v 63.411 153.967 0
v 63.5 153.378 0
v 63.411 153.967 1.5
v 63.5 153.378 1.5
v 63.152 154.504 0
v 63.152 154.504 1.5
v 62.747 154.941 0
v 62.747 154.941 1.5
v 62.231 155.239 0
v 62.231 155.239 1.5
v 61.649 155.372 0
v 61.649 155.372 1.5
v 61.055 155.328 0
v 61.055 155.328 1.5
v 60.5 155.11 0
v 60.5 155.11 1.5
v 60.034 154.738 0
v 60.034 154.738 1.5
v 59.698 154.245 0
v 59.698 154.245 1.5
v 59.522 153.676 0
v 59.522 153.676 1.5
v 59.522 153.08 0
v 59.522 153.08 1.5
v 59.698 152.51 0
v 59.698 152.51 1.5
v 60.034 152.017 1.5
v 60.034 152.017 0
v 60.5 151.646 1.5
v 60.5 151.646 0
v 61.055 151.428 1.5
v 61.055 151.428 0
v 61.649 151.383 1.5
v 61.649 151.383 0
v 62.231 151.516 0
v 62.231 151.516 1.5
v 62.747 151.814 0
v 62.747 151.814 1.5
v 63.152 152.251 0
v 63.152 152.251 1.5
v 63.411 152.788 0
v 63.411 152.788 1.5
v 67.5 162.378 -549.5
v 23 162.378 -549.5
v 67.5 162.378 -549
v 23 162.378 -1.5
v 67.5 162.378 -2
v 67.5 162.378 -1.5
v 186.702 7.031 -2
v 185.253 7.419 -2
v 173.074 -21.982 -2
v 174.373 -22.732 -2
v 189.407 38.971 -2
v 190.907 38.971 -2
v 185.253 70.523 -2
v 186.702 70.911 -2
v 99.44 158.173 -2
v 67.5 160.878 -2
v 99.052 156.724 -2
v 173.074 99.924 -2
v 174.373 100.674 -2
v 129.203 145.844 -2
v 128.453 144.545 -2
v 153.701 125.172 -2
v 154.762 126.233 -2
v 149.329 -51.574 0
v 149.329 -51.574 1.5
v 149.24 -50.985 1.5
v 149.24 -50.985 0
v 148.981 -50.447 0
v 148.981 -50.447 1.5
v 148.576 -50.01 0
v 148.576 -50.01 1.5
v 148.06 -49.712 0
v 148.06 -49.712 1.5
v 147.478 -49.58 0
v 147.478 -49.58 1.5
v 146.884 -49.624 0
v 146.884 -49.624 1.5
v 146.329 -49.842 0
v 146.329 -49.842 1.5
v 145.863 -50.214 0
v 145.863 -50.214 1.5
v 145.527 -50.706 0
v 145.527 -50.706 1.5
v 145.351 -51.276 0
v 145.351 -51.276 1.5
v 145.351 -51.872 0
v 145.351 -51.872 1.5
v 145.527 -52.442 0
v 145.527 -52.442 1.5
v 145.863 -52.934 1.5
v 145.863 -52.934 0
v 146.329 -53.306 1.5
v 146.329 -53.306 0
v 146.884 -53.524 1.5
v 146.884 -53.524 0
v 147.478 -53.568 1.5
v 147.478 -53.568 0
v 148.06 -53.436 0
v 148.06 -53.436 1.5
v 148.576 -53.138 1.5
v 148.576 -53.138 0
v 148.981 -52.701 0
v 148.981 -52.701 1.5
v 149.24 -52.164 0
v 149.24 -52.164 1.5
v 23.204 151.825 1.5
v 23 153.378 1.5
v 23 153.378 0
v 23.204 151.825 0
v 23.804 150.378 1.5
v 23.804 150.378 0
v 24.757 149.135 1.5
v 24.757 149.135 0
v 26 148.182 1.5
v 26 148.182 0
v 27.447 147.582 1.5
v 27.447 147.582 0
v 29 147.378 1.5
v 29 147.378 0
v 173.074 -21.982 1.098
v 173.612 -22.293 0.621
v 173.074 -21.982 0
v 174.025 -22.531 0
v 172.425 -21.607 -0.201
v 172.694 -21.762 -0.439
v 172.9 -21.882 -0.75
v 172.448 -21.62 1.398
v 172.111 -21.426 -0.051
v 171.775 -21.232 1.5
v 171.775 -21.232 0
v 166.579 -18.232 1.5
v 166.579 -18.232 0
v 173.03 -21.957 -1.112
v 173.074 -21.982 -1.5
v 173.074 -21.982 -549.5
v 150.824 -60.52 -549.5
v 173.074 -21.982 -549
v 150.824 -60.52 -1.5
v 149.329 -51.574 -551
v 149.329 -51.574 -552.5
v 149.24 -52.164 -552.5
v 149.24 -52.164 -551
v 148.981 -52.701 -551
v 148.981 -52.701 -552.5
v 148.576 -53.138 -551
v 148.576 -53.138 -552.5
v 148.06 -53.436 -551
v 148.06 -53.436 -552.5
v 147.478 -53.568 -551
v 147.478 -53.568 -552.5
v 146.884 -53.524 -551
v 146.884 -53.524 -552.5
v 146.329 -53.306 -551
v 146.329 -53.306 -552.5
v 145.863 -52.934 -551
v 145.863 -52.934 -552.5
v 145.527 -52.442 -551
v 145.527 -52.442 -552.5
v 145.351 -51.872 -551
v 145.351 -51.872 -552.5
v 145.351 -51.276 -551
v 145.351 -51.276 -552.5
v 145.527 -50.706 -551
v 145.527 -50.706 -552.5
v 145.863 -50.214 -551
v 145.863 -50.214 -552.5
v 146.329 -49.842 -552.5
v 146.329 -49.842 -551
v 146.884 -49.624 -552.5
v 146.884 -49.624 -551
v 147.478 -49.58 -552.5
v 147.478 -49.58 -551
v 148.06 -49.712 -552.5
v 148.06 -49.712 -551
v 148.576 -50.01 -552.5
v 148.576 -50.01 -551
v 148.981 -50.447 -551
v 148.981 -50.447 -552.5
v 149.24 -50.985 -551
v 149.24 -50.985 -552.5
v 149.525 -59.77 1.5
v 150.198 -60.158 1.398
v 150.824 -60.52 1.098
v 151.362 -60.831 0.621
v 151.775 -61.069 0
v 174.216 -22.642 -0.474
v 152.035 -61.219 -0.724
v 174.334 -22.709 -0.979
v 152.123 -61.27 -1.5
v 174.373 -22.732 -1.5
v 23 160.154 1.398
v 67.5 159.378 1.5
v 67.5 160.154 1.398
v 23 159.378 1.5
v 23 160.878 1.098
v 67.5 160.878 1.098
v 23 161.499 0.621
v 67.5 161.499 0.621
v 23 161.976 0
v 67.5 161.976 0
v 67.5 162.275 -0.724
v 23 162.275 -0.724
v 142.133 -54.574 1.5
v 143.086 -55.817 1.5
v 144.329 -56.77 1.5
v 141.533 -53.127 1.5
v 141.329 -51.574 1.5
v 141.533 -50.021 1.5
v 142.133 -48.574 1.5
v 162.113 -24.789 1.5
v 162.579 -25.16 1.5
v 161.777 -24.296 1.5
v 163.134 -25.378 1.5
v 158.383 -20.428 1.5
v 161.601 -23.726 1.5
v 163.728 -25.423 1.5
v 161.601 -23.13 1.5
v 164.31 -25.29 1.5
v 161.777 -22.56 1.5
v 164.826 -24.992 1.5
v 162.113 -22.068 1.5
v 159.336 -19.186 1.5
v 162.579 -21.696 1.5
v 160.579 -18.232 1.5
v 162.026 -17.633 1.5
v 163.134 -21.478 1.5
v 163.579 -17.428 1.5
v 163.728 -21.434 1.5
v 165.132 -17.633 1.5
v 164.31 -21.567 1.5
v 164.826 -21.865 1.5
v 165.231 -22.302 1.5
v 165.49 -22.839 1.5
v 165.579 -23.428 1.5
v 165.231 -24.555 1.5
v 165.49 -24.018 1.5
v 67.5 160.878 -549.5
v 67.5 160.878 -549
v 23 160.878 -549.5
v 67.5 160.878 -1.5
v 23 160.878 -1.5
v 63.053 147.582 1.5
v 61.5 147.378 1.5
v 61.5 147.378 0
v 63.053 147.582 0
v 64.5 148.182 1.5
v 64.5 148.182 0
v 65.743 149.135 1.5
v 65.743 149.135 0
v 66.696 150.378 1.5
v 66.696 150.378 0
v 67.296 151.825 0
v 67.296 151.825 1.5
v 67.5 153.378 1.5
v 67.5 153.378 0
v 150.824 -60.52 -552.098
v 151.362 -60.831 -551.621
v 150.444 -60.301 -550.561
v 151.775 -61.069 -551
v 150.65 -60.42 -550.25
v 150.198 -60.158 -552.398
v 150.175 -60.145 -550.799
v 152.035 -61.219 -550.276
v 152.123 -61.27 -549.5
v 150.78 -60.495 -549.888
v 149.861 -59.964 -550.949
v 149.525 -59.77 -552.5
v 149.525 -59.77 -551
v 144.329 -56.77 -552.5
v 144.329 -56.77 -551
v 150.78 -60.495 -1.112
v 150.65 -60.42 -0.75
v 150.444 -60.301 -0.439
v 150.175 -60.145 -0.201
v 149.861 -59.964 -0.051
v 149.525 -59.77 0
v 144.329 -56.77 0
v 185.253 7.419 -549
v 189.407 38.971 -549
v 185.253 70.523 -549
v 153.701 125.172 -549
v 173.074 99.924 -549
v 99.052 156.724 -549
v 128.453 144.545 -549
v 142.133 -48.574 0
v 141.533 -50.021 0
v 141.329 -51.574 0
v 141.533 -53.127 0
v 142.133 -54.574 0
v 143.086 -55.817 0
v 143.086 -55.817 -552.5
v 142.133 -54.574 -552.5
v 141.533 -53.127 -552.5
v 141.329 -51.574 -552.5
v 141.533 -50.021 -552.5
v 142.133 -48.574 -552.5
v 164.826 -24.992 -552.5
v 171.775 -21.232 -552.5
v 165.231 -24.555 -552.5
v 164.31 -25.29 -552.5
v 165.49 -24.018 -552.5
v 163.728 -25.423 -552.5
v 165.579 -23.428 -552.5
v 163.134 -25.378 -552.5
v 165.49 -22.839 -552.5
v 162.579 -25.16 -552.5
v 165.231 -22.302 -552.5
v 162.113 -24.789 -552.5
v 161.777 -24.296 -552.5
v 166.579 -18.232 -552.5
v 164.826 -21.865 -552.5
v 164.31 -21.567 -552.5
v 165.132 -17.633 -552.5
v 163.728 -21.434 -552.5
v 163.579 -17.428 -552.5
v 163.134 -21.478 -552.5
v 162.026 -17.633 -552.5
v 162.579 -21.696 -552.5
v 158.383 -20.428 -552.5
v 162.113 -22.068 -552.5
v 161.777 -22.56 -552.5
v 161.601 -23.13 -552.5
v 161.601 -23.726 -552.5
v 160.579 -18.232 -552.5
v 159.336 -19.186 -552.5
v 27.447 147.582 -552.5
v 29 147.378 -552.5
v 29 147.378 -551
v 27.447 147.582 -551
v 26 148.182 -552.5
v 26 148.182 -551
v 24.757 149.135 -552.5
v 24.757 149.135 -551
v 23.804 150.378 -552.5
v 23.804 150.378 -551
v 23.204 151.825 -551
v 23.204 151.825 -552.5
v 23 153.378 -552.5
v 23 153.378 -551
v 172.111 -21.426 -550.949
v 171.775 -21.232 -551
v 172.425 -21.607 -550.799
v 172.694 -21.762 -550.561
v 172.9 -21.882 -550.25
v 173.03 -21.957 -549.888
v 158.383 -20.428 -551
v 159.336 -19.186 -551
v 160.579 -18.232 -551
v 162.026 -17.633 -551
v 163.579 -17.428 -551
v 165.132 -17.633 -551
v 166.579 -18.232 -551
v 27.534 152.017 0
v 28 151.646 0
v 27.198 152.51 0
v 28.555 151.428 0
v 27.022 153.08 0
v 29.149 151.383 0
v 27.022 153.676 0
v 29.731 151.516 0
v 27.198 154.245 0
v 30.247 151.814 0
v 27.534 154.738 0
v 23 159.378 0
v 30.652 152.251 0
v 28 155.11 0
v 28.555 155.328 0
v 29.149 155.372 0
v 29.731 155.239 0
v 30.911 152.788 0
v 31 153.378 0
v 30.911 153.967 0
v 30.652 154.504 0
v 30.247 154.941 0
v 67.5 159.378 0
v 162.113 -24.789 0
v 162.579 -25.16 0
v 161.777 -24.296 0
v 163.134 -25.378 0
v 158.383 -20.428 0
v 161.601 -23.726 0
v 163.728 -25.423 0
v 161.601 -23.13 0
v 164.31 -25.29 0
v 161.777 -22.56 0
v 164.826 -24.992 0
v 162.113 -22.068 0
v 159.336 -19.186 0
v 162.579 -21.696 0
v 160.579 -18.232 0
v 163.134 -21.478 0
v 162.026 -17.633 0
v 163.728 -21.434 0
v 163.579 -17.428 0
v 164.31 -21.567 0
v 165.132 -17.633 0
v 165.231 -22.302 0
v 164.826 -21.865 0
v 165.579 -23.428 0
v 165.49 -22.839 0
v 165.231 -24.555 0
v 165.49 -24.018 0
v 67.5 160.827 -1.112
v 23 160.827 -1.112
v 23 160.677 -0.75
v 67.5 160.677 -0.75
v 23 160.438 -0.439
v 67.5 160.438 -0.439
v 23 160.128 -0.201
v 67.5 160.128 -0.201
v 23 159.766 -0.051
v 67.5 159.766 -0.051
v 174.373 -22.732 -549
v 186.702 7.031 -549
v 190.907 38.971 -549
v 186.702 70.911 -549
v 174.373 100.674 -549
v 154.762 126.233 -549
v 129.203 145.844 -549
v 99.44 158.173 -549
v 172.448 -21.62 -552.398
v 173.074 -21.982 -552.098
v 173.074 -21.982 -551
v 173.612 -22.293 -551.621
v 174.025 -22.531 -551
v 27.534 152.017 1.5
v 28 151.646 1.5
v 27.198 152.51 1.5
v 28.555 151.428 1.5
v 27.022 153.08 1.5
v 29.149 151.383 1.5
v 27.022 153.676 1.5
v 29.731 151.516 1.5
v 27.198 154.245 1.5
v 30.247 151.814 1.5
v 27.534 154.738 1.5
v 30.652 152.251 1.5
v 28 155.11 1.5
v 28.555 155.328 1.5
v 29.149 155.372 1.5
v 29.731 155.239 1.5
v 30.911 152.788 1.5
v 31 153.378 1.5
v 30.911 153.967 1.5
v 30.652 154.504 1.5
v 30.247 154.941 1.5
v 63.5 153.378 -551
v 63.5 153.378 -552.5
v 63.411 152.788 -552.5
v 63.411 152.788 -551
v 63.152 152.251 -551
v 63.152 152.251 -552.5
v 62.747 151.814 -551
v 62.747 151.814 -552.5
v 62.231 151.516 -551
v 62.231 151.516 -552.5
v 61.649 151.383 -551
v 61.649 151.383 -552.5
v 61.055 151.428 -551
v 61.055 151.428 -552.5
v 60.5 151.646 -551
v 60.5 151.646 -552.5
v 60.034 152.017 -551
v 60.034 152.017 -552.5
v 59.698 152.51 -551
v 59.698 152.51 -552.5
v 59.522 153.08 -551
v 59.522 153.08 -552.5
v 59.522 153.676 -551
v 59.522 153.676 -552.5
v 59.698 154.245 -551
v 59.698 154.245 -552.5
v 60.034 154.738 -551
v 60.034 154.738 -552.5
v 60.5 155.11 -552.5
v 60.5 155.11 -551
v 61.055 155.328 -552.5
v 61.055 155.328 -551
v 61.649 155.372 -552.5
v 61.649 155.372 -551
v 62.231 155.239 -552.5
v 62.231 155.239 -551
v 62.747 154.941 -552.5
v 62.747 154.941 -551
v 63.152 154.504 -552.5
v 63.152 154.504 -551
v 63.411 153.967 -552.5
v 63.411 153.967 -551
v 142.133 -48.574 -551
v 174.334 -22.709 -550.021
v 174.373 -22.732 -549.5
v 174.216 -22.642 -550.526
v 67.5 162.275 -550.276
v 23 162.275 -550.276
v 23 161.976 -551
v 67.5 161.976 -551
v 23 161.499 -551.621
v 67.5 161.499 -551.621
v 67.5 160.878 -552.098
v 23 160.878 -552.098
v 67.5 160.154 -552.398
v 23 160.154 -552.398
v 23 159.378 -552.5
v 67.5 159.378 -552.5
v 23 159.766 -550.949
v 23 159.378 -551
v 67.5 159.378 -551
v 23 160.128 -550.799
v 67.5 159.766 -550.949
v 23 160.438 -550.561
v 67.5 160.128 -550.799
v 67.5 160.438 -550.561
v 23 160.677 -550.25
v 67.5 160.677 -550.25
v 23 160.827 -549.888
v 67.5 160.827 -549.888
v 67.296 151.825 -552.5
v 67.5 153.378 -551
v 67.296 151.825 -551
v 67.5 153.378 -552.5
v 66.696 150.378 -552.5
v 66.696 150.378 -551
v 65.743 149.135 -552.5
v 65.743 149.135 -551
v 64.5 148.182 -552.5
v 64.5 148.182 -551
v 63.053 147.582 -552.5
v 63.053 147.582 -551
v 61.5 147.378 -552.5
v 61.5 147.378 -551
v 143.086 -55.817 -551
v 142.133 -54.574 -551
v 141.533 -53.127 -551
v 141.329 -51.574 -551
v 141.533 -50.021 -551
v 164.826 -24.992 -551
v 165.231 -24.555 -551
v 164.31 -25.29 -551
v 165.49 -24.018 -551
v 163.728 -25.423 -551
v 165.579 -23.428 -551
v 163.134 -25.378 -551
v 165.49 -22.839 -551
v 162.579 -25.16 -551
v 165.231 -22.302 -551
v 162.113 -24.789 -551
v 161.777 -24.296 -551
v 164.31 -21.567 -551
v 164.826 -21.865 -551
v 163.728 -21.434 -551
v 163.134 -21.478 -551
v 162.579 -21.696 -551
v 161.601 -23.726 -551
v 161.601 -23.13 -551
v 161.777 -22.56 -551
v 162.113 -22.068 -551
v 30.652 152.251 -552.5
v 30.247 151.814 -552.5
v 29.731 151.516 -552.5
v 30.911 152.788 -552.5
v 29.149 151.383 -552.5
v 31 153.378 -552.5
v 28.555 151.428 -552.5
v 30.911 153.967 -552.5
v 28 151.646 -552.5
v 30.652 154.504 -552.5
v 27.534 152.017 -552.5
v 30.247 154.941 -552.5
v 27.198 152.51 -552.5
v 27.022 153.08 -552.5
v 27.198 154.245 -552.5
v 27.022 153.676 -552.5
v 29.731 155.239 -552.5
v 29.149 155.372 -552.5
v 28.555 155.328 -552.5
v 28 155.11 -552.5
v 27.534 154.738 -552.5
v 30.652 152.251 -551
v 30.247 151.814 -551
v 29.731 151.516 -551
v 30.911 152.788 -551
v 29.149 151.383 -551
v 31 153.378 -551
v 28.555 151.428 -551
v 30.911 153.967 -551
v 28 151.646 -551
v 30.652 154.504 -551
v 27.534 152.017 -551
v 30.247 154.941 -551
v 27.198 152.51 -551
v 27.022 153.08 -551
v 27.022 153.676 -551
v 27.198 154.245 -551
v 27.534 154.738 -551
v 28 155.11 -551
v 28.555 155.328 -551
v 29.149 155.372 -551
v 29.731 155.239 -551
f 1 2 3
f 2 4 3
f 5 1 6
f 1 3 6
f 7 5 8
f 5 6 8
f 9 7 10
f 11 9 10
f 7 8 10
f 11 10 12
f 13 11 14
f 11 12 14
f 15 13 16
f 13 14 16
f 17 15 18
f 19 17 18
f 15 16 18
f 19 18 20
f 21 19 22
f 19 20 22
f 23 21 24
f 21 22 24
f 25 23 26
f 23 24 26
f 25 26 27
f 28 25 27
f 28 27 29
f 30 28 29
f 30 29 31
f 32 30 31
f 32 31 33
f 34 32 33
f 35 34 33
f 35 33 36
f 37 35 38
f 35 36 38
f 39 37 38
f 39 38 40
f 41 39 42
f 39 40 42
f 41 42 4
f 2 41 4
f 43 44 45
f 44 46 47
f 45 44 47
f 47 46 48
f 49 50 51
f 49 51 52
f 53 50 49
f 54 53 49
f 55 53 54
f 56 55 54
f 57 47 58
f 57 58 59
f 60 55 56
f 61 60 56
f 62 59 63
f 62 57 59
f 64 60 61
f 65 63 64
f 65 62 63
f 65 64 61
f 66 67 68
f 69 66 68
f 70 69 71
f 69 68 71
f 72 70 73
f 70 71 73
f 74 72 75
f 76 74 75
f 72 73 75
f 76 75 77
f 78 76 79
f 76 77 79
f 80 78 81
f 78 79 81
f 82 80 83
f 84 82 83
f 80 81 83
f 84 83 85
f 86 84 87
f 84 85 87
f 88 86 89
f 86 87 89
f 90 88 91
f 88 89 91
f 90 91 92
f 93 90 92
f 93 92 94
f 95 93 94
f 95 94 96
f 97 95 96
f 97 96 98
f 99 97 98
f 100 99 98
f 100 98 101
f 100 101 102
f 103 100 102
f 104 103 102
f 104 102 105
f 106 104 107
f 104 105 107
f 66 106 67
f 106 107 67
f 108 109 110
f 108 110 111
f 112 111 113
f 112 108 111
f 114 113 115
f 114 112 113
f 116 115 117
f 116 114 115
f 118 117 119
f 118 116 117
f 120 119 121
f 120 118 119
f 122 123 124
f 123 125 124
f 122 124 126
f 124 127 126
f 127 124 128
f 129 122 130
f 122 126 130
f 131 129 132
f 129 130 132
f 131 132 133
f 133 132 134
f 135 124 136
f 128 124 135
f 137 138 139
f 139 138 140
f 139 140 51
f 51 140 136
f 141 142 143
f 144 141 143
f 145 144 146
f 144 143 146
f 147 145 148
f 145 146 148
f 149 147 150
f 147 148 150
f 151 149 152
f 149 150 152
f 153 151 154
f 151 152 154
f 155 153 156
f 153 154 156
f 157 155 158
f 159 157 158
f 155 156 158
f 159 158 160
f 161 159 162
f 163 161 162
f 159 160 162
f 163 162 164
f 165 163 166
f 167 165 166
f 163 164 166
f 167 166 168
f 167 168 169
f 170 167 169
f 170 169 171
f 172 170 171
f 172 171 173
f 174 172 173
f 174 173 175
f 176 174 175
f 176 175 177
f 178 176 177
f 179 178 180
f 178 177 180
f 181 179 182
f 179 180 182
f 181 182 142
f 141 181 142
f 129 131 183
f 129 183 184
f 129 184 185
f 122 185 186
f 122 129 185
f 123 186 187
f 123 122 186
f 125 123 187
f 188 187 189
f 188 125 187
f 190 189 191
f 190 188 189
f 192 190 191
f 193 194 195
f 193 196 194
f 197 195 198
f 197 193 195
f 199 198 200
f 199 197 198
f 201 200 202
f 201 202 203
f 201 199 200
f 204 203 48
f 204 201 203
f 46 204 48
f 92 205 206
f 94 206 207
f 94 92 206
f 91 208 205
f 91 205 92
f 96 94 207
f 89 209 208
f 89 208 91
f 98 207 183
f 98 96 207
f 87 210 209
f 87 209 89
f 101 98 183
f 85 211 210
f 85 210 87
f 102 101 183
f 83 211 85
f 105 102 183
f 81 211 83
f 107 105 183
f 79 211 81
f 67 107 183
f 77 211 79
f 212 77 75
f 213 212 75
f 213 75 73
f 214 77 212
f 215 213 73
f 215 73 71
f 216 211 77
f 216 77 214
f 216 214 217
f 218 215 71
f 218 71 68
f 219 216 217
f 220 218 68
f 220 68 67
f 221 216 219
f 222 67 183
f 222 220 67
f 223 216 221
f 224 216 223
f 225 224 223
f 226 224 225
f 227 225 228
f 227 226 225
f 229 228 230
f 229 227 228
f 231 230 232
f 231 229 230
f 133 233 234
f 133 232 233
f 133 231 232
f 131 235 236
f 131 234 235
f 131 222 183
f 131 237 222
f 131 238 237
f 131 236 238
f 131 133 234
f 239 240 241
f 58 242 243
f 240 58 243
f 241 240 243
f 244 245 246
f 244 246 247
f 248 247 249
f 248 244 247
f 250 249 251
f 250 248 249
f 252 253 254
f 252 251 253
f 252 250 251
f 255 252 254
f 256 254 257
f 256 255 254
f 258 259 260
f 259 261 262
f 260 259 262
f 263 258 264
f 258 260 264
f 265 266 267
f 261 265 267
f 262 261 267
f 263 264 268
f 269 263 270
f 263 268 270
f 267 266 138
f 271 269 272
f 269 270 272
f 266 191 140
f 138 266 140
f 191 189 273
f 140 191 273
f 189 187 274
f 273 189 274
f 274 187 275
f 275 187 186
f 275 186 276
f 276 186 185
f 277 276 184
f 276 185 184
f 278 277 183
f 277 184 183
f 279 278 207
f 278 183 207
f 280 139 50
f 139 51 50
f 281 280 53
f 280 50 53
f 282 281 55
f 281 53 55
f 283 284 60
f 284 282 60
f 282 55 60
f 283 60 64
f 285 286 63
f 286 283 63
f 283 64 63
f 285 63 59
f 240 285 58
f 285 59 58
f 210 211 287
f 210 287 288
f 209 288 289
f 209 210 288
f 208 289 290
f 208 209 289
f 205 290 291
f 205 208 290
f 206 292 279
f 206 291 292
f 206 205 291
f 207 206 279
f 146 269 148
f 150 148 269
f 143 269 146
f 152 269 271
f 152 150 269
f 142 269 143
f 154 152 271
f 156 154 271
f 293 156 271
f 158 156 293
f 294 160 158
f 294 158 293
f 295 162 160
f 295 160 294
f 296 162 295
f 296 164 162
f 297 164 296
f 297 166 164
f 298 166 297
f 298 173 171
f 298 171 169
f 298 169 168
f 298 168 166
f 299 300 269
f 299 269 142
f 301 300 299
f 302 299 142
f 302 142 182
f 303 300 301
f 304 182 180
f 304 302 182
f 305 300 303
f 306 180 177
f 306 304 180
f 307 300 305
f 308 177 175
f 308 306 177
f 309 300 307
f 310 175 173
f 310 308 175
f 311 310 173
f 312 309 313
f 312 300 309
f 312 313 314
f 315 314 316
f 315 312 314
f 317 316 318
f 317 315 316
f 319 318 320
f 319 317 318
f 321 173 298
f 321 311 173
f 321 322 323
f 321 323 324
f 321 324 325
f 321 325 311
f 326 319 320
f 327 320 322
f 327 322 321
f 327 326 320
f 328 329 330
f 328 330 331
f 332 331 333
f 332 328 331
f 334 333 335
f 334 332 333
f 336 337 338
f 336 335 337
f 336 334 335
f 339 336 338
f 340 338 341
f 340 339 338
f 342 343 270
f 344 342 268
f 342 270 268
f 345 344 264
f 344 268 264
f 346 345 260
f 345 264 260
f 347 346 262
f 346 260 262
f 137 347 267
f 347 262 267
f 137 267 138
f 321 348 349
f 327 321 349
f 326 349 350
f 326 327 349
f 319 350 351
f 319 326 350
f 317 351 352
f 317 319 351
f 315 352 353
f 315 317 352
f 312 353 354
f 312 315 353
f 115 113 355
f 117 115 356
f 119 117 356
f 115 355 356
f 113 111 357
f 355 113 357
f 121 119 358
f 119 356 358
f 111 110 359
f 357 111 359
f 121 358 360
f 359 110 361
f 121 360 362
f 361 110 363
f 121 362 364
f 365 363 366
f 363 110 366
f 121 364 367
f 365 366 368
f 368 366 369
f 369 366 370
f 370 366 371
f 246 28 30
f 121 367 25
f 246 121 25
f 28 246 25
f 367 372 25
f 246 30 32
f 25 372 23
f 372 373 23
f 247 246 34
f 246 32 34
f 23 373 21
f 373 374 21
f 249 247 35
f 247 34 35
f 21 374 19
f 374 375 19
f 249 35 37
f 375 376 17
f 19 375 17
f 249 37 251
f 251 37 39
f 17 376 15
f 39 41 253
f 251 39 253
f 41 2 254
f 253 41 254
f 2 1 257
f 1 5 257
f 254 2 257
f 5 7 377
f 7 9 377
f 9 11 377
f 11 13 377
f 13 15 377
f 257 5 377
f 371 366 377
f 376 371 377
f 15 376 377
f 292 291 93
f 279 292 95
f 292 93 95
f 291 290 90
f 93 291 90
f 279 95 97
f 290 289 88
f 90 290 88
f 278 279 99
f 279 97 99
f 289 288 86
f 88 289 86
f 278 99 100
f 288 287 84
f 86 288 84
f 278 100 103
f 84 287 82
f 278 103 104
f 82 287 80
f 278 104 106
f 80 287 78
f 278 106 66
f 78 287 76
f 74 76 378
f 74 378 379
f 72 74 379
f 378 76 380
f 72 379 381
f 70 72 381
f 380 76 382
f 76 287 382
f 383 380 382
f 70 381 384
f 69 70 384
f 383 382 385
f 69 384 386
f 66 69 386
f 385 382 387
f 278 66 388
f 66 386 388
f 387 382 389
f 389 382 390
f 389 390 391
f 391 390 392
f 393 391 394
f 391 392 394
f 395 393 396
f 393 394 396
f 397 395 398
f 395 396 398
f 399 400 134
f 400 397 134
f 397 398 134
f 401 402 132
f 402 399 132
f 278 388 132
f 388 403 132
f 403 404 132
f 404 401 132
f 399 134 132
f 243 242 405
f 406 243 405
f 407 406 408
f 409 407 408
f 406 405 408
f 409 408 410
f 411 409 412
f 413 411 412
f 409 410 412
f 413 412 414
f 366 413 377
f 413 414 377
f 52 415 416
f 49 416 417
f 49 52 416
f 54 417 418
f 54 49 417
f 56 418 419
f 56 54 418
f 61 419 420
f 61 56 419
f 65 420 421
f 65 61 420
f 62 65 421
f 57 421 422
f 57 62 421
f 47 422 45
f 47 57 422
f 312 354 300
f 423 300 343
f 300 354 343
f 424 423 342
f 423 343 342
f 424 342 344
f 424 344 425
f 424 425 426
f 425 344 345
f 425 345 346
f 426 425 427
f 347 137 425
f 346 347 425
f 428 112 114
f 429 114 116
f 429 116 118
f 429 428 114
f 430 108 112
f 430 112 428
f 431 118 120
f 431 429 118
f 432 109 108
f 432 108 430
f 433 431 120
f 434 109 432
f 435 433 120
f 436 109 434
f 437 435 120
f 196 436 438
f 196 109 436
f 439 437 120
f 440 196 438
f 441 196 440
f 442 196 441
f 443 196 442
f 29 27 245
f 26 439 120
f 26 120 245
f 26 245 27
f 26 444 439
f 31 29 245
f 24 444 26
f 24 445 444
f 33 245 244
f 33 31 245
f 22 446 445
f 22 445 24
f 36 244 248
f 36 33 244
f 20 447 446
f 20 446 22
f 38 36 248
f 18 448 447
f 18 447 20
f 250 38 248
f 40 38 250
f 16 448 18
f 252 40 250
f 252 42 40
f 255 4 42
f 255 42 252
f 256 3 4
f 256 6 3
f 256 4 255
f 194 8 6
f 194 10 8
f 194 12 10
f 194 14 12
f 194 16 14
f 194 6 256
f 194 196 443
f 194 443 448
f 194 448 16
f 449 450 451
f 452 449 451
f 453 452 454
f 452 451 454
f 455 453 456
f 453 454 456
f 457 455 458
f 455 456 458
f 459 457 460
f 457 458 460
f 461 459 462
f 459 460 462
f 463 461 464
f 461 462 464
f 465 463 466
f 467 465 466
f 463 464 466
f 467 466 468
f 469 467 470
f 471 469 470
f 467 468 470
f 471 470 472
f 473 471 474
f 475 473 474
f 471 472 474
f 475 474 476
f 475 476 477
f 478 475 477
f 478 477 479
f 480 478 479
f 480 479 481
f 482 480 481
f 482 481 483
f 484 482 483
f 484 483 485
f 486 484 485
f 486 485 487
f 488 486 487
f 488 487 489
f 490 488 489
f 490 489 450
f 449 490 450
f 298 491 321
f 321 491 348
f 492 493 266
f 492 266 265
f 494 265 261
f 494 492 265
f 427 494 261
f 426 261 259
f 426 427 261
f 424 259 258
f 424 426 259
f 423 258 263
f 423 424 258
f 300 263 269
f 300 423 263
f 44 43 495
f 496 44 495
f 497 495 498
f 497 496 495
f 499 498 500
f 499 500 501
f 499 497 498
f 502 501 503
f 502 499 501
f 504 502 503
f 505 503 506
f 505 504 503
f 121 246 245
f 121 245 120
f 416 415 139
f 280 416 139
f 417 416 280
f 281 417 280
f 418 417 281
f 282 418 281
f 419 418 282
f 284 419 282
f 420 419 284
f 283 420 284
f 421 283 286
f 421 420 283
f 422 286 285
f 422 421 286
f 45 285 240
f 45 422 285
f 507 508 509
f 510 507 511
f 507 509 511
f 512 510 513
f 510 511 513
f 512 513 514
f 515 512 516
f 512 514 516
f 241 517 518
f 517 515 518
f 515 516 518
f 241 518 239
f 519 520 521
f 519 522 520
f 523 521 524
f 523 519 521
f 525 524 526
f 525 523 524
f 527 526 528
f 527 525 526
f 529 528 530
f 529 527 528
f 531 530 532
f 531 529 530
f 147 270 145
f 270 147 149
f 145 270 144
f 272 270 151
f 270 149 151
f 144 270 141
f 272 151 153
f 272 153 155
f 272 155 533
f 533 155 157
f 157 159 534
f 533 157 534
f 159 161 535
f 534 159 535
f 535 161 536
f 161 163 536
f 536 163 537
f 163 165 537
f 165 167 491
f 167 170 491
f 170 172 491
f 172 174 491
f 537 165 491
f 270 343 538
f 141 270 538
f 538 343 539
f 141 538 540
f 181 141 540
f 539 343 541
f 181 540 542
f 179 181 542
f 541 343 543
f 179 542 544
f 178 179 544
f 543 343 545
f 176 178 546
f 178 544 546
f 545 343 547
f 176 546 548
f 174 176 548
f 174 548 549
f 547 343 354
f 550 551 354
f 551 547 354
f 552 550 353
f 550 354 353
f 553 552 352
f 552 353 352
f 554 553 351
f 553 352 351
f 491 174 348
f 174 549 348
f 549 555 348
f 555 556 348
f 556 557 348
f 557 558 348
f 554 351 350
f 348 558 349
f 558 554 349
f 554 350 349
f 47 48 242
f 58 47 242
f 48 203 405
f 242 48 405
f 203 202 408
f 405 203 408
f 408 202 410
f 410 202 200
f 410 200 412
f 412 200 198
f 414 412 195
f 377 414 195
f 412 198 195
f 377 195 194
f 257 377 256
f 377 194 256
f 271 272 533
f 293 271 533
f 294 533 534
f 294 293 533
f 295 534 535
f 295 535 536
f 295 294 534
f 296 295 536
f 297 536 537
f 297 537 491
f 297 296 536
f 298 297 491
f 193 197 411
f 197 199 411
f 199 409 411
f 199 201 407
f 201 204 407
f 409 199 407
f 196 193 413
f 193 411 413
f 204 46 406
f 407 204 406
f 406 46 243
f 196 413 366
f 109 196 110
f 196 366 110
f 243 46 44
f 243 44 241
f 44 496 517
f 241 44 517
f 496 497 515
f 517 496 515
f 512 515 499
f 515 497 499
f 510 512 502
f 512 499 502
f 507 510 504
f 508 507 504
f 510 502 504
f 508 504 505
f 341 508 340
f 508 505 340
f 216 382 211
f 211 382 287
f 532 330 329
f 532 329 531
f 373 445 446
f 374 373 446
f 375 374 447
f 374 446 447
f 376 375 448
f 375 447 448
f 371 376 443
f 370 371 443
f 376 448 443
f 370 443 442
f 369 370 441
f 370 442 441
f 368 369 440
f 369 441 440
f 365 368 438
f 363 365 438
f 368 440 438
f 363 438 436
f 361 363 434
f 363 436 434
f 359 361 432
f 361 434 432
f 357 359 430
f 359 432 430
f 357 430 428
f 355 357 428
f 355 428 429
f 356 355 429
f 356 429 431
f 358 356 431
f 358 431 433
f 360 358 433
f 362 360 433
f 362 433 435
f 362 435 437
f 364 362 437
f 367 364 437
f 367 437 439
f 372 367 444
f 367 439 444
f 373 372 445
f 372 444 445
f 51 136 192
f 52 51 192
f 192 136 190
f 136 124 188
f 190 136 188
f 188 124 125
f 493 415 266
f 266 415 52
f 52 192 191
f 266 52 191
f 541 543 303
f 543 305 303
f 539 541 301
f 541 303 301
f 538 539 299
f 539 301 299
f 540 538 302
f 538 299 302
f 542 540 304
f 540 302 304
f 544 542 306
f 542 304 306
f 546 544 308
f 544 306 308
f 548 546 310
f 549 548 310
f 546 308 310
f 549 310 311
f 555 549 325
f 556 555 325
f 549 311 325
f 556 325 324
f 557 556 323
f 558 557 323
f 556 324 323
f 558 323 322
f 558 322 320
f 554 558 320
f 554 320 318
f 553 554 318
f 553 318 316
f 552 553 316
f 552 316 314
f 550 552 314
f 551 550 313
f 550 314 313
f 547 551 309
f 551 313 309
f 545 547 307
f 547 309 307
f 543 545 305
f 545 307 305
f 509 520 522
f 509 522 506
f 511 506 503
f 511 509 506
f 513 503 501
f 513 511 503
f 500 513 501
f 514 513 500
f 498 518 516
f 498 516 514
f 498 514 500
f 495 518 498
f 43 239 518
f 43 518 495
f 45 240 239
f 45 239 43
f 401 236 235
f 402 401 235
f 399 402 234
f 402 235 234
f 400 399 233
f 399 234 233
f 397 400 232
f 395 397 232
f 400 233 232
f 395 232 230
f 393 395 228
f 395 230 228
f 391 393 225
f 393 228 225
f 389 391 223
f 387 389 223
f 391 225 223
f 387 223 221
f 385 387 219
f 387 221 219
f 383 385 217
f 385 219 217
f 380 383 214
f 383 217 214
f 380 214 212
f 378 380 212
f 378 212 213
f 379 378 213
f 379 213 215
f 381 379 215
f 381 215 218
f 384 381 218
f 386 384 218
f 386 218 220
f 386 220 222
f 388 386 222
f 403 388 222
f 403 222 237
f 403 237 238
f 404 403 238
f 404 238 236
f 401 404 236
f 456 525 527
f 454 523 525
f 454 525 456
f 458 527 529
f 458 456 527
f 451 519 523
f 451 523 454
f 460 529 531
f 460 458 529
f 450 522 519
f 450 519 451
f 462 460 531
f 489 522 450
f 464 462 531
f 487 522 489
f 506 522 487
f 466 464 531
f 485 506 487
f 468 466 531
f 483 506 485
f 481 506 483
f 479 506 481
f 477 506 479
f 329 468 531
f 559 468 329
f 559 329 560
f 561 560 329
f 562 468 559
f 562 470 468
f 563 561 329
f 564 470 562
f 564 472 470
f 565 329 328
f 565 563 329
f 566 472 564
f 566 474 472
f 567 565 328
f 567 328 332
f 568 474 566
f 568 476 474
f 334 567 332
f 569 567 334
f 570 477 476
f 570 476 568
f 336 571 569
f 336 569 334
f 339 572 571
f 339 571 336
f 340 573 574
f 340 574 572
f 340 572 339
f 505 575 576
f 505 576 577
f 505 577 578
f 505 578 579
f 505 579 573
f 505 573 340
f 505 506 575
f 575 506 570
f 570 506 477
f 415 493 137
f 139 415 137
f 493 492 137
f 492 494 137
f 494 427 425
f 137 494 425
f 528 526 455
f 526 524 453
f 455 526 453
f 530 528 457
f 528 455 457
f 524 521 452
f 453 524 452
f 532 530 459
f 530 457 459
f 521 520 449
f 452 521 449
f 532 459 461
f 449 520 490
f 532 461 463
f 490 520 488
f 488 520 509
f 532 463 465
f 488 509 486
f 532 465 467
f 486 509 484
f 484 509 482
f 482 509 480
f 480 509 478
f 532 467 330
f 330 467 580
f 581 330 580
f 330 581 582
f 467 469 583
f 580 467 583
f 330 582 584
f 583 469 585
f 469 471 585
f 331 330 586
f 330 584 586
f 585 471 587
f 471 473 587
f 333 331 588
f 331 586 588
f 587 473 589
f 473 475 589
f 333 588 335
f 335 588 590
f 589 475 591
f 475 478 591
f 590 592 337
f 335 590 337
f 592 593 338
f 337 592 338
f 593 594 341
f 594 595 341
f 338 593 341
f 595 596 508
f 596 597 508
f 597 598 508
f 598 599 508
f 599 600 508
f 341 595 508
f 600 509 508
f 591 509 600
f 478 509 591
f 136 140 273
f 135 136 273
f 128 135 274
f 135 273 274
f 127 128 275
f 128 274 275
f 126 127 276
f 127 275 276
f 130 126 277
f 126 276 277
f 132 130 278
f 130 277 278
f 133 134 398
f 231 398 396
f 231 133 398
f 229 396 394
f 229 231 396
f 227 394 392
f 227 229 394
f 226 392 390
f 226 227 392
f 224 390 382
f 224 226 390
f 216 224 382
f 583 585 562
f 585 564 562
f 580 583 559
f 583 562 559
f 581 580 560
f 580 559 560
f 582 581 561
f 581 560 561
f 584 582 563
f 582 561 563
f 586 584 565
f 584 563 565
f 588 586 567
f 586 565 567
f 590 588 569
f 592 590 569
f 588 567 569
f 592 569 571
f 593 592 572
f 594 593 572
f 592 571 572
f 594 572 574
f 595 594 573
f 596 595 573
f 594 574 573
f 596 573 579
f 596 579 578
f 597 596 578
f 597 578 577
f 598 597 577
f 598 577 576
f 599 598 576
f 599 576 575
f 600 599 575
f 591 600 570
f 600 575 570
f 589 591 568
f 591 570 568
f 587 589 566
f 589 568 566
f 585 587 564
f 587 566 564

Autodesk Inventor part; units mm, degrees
ref_plane "YZ Plane" through (0, 0, 0) normal (1, 0, 0) x (0, 1, 0)
ref_plane "XZ Plane" through (0, 0, 0) normal (0, 1, 0) x (-1, 0, 0)
ref_plane "Work Plane1" through (0, 0, 0) normal (0, 0, 1) x (1, 0, 0)
sketch "Sketch1" plane through (0, 0, 0) normal (0, 0, 1) x (1, 0, 0)
  arc A0 (173.074137, -21.982113) -> (67.5, 160.877656) centre (67.5, 38.971143) ccw
  line L0 (67.5, 160.877656) -> (23, 160.877656)
  line L1 (150.824137, -60.520244) -> (173.074137, -21.982113)
  line L2 (23, 162.377656) -> (67.5, 162.377656)
  arc A1 (174.373175, -22.732113) -> (67.5, 162.377656) centre (67.5, 38.971143) ccw
  line L3 (174.373175, -22.732113) -> (152.123175, -61.270244)
  line L4 (150.824137, -60.520244) -> (152.123175, -61.270244)
  line L5 (23, 160.877656) -> (23, 162.377656)
  point P0 (0, 0)
  dimension "d0" = 1.5
ref_plane "Work Plane2" through (-342.433406, -360.707407, -533) normal (0, 0, -1) x (0, 1, 0)
extrude "Extrusion1" add sketch "Sketch1" against normal blind 551
sketch "Sketch2" plane through (0, 0, 0) normal (0, 0, 1) x (1, 0, 0)
  line L0 (174.373175, -22.732113) -> (152.123175, -61.270244)
  arc A0 (174.373175, -22.732113) -> (67.5, 162.377656) centre (67.5, 38.971143) ccw
  line L1 (23, 162.377656) -> (67.5, 162.377656)
  line L2 (23, 162.377656) -> (67.5, 162.377656)
  line L3 (67.5, 162.377656) -> (67.5, 147.377656)
  line L4 (67.5, 147.377656) -> (23, 147.377656)
  line L5 (23, 147.377656) -> (23, 162.377656)
  line L6 (152.123175, -61.270244) -> (174.373175, -22.732113)
  line L7 (174.373175, -22.732113) -> (161.382794, -15.232113)
  line L8 (161.382794, -15.232113) -> (139.132794, -53.770244)
  line L9 (139.132794, -53.770244) -> (152.123175, -61.270244)
  point P0 (0, 0)
  dimension "d3" = 15
  dimension "d4" = 15
extrude "Extrusion2" add sketch "Sketch2" along normal blind 1.5
fillet "Fillet4" radius 6 4 edges at (161.3828, -15.2321, 0.75) (139.1328, -53.7702, 0.75) (23, 147.3777, 0.75) (67.5, 147.3777, 0.75)
sketch "Sketch5" plane through (0, 0, 1.5) normal (0, 0, 1) x (1, 0, 0)
  arc A0 (61.5, 147.377656) -> (67.5, 153.377656) centre (61.5, 153.377656) ccw
  arc A1 (23, 153.377656) -> (29, 147.377656) centre (29, 153.377656) ccw
  arc A2 (142.132794, -48.574091) -> (144.328946, -56.770244) centre (147.328946, -51.574091) ccw
  line L0 (144.328946, -56.770244) -> (152.123175, -61.270244)
  line L1 (174.373175, -22.732113) -> (166.578946, -18.232113)
  arc A3 (166.578946, -18.232113) -> (158.382794, -20.428266) centre (163.578946, -23.428266) ccw
  line L2 (158.382794, -20.428266) -> (142.132794, -48.574091)
  circle A4 centre (29, 153.377656) radius 2
  circle A5 centre (61.5, 153.377656) radius 2
  circle A6 centre (163.578946, -23.428266) radius 2
  circle A7 centre (147.328946, -51.574091) radius 2
  line L3 (152.123175, -61.270244) -> (174.373175, -22.732113)
  point P0 (0, 0)
  dimension "d17" = 4
  dimension "d18" = 4
  dimension "d19" = 4
  dimension "d20" = 4
extrude "Extrusion5" cut sketch "Sketch5" against normal blind 2 contours A4 | A5 | A6 | A7
fillet "Fillet5" radius 1.5 2 edges at (45.25, 160.8777, 0) (161.9491, -41.2512, 0)
ref_plane "Work Plane5" through (0, 0, -275.5) normal (0, 0, 1) x (1, 0, 0)
mirror "Mirror3" about plane through (0, 0, -275.5) normal (0, 0, 1) of "Extrusion2", "Extrusion5", "Fillet4", "Fillet5"
sketch "Sketch7" plane through (0, 0, -551) normal (0, 0, -1) x (-1, 0, 0)
  line L0 (-67.5, 160.877656) -> (-67.5, 162.377656)
  arc A0 (-67.5, 162.377656) -> (-174.373175, -22.732113) centre (-67.5, 38.971143) ccw
  line L1 (-174.373175, -22.732113) -> (-173.074137, -21.982113)
  arc A1 (-67.5, 160.877656) -> (-173.074137, -21.982113) centre (-67.5, 38.971143) ccw
  point P0 (0, 0)
extrude "Extrusion7" cut sketch "Sketch7" against normal blind 2
sketch "Sketch8" plane through (0, 0, 0) normal (0, 0, 1) x (1, 0, 0)
  line L0 (67.5, 162.377656) -> (67.5, 160.877656)
  arc A0 (173.074137, -21.982113) -> (67.5, 160.877656) centre (67.5, 38.971143) ccw
  line L1 (173.074137, -21.982113) -> (174.373175, -22.732113)
  arc A1 (174.373175, -22.732113) -> (67.5, 162.377656) centre (67.5, 38.971143) ccw
  point P0 (0, 0)
extrude "Extrusion8" cut sketch "Sketch8" against normal blind 2
fillet "Fillet7" radius 3 4 edges at (45.25, 162.3777, 1.5) (163.2482, -42.0012, 1.5) (163.2482, -42.0012, -552.5) (45.25, 162.3777, -552.5)
properties material "Aluminum 6061"
